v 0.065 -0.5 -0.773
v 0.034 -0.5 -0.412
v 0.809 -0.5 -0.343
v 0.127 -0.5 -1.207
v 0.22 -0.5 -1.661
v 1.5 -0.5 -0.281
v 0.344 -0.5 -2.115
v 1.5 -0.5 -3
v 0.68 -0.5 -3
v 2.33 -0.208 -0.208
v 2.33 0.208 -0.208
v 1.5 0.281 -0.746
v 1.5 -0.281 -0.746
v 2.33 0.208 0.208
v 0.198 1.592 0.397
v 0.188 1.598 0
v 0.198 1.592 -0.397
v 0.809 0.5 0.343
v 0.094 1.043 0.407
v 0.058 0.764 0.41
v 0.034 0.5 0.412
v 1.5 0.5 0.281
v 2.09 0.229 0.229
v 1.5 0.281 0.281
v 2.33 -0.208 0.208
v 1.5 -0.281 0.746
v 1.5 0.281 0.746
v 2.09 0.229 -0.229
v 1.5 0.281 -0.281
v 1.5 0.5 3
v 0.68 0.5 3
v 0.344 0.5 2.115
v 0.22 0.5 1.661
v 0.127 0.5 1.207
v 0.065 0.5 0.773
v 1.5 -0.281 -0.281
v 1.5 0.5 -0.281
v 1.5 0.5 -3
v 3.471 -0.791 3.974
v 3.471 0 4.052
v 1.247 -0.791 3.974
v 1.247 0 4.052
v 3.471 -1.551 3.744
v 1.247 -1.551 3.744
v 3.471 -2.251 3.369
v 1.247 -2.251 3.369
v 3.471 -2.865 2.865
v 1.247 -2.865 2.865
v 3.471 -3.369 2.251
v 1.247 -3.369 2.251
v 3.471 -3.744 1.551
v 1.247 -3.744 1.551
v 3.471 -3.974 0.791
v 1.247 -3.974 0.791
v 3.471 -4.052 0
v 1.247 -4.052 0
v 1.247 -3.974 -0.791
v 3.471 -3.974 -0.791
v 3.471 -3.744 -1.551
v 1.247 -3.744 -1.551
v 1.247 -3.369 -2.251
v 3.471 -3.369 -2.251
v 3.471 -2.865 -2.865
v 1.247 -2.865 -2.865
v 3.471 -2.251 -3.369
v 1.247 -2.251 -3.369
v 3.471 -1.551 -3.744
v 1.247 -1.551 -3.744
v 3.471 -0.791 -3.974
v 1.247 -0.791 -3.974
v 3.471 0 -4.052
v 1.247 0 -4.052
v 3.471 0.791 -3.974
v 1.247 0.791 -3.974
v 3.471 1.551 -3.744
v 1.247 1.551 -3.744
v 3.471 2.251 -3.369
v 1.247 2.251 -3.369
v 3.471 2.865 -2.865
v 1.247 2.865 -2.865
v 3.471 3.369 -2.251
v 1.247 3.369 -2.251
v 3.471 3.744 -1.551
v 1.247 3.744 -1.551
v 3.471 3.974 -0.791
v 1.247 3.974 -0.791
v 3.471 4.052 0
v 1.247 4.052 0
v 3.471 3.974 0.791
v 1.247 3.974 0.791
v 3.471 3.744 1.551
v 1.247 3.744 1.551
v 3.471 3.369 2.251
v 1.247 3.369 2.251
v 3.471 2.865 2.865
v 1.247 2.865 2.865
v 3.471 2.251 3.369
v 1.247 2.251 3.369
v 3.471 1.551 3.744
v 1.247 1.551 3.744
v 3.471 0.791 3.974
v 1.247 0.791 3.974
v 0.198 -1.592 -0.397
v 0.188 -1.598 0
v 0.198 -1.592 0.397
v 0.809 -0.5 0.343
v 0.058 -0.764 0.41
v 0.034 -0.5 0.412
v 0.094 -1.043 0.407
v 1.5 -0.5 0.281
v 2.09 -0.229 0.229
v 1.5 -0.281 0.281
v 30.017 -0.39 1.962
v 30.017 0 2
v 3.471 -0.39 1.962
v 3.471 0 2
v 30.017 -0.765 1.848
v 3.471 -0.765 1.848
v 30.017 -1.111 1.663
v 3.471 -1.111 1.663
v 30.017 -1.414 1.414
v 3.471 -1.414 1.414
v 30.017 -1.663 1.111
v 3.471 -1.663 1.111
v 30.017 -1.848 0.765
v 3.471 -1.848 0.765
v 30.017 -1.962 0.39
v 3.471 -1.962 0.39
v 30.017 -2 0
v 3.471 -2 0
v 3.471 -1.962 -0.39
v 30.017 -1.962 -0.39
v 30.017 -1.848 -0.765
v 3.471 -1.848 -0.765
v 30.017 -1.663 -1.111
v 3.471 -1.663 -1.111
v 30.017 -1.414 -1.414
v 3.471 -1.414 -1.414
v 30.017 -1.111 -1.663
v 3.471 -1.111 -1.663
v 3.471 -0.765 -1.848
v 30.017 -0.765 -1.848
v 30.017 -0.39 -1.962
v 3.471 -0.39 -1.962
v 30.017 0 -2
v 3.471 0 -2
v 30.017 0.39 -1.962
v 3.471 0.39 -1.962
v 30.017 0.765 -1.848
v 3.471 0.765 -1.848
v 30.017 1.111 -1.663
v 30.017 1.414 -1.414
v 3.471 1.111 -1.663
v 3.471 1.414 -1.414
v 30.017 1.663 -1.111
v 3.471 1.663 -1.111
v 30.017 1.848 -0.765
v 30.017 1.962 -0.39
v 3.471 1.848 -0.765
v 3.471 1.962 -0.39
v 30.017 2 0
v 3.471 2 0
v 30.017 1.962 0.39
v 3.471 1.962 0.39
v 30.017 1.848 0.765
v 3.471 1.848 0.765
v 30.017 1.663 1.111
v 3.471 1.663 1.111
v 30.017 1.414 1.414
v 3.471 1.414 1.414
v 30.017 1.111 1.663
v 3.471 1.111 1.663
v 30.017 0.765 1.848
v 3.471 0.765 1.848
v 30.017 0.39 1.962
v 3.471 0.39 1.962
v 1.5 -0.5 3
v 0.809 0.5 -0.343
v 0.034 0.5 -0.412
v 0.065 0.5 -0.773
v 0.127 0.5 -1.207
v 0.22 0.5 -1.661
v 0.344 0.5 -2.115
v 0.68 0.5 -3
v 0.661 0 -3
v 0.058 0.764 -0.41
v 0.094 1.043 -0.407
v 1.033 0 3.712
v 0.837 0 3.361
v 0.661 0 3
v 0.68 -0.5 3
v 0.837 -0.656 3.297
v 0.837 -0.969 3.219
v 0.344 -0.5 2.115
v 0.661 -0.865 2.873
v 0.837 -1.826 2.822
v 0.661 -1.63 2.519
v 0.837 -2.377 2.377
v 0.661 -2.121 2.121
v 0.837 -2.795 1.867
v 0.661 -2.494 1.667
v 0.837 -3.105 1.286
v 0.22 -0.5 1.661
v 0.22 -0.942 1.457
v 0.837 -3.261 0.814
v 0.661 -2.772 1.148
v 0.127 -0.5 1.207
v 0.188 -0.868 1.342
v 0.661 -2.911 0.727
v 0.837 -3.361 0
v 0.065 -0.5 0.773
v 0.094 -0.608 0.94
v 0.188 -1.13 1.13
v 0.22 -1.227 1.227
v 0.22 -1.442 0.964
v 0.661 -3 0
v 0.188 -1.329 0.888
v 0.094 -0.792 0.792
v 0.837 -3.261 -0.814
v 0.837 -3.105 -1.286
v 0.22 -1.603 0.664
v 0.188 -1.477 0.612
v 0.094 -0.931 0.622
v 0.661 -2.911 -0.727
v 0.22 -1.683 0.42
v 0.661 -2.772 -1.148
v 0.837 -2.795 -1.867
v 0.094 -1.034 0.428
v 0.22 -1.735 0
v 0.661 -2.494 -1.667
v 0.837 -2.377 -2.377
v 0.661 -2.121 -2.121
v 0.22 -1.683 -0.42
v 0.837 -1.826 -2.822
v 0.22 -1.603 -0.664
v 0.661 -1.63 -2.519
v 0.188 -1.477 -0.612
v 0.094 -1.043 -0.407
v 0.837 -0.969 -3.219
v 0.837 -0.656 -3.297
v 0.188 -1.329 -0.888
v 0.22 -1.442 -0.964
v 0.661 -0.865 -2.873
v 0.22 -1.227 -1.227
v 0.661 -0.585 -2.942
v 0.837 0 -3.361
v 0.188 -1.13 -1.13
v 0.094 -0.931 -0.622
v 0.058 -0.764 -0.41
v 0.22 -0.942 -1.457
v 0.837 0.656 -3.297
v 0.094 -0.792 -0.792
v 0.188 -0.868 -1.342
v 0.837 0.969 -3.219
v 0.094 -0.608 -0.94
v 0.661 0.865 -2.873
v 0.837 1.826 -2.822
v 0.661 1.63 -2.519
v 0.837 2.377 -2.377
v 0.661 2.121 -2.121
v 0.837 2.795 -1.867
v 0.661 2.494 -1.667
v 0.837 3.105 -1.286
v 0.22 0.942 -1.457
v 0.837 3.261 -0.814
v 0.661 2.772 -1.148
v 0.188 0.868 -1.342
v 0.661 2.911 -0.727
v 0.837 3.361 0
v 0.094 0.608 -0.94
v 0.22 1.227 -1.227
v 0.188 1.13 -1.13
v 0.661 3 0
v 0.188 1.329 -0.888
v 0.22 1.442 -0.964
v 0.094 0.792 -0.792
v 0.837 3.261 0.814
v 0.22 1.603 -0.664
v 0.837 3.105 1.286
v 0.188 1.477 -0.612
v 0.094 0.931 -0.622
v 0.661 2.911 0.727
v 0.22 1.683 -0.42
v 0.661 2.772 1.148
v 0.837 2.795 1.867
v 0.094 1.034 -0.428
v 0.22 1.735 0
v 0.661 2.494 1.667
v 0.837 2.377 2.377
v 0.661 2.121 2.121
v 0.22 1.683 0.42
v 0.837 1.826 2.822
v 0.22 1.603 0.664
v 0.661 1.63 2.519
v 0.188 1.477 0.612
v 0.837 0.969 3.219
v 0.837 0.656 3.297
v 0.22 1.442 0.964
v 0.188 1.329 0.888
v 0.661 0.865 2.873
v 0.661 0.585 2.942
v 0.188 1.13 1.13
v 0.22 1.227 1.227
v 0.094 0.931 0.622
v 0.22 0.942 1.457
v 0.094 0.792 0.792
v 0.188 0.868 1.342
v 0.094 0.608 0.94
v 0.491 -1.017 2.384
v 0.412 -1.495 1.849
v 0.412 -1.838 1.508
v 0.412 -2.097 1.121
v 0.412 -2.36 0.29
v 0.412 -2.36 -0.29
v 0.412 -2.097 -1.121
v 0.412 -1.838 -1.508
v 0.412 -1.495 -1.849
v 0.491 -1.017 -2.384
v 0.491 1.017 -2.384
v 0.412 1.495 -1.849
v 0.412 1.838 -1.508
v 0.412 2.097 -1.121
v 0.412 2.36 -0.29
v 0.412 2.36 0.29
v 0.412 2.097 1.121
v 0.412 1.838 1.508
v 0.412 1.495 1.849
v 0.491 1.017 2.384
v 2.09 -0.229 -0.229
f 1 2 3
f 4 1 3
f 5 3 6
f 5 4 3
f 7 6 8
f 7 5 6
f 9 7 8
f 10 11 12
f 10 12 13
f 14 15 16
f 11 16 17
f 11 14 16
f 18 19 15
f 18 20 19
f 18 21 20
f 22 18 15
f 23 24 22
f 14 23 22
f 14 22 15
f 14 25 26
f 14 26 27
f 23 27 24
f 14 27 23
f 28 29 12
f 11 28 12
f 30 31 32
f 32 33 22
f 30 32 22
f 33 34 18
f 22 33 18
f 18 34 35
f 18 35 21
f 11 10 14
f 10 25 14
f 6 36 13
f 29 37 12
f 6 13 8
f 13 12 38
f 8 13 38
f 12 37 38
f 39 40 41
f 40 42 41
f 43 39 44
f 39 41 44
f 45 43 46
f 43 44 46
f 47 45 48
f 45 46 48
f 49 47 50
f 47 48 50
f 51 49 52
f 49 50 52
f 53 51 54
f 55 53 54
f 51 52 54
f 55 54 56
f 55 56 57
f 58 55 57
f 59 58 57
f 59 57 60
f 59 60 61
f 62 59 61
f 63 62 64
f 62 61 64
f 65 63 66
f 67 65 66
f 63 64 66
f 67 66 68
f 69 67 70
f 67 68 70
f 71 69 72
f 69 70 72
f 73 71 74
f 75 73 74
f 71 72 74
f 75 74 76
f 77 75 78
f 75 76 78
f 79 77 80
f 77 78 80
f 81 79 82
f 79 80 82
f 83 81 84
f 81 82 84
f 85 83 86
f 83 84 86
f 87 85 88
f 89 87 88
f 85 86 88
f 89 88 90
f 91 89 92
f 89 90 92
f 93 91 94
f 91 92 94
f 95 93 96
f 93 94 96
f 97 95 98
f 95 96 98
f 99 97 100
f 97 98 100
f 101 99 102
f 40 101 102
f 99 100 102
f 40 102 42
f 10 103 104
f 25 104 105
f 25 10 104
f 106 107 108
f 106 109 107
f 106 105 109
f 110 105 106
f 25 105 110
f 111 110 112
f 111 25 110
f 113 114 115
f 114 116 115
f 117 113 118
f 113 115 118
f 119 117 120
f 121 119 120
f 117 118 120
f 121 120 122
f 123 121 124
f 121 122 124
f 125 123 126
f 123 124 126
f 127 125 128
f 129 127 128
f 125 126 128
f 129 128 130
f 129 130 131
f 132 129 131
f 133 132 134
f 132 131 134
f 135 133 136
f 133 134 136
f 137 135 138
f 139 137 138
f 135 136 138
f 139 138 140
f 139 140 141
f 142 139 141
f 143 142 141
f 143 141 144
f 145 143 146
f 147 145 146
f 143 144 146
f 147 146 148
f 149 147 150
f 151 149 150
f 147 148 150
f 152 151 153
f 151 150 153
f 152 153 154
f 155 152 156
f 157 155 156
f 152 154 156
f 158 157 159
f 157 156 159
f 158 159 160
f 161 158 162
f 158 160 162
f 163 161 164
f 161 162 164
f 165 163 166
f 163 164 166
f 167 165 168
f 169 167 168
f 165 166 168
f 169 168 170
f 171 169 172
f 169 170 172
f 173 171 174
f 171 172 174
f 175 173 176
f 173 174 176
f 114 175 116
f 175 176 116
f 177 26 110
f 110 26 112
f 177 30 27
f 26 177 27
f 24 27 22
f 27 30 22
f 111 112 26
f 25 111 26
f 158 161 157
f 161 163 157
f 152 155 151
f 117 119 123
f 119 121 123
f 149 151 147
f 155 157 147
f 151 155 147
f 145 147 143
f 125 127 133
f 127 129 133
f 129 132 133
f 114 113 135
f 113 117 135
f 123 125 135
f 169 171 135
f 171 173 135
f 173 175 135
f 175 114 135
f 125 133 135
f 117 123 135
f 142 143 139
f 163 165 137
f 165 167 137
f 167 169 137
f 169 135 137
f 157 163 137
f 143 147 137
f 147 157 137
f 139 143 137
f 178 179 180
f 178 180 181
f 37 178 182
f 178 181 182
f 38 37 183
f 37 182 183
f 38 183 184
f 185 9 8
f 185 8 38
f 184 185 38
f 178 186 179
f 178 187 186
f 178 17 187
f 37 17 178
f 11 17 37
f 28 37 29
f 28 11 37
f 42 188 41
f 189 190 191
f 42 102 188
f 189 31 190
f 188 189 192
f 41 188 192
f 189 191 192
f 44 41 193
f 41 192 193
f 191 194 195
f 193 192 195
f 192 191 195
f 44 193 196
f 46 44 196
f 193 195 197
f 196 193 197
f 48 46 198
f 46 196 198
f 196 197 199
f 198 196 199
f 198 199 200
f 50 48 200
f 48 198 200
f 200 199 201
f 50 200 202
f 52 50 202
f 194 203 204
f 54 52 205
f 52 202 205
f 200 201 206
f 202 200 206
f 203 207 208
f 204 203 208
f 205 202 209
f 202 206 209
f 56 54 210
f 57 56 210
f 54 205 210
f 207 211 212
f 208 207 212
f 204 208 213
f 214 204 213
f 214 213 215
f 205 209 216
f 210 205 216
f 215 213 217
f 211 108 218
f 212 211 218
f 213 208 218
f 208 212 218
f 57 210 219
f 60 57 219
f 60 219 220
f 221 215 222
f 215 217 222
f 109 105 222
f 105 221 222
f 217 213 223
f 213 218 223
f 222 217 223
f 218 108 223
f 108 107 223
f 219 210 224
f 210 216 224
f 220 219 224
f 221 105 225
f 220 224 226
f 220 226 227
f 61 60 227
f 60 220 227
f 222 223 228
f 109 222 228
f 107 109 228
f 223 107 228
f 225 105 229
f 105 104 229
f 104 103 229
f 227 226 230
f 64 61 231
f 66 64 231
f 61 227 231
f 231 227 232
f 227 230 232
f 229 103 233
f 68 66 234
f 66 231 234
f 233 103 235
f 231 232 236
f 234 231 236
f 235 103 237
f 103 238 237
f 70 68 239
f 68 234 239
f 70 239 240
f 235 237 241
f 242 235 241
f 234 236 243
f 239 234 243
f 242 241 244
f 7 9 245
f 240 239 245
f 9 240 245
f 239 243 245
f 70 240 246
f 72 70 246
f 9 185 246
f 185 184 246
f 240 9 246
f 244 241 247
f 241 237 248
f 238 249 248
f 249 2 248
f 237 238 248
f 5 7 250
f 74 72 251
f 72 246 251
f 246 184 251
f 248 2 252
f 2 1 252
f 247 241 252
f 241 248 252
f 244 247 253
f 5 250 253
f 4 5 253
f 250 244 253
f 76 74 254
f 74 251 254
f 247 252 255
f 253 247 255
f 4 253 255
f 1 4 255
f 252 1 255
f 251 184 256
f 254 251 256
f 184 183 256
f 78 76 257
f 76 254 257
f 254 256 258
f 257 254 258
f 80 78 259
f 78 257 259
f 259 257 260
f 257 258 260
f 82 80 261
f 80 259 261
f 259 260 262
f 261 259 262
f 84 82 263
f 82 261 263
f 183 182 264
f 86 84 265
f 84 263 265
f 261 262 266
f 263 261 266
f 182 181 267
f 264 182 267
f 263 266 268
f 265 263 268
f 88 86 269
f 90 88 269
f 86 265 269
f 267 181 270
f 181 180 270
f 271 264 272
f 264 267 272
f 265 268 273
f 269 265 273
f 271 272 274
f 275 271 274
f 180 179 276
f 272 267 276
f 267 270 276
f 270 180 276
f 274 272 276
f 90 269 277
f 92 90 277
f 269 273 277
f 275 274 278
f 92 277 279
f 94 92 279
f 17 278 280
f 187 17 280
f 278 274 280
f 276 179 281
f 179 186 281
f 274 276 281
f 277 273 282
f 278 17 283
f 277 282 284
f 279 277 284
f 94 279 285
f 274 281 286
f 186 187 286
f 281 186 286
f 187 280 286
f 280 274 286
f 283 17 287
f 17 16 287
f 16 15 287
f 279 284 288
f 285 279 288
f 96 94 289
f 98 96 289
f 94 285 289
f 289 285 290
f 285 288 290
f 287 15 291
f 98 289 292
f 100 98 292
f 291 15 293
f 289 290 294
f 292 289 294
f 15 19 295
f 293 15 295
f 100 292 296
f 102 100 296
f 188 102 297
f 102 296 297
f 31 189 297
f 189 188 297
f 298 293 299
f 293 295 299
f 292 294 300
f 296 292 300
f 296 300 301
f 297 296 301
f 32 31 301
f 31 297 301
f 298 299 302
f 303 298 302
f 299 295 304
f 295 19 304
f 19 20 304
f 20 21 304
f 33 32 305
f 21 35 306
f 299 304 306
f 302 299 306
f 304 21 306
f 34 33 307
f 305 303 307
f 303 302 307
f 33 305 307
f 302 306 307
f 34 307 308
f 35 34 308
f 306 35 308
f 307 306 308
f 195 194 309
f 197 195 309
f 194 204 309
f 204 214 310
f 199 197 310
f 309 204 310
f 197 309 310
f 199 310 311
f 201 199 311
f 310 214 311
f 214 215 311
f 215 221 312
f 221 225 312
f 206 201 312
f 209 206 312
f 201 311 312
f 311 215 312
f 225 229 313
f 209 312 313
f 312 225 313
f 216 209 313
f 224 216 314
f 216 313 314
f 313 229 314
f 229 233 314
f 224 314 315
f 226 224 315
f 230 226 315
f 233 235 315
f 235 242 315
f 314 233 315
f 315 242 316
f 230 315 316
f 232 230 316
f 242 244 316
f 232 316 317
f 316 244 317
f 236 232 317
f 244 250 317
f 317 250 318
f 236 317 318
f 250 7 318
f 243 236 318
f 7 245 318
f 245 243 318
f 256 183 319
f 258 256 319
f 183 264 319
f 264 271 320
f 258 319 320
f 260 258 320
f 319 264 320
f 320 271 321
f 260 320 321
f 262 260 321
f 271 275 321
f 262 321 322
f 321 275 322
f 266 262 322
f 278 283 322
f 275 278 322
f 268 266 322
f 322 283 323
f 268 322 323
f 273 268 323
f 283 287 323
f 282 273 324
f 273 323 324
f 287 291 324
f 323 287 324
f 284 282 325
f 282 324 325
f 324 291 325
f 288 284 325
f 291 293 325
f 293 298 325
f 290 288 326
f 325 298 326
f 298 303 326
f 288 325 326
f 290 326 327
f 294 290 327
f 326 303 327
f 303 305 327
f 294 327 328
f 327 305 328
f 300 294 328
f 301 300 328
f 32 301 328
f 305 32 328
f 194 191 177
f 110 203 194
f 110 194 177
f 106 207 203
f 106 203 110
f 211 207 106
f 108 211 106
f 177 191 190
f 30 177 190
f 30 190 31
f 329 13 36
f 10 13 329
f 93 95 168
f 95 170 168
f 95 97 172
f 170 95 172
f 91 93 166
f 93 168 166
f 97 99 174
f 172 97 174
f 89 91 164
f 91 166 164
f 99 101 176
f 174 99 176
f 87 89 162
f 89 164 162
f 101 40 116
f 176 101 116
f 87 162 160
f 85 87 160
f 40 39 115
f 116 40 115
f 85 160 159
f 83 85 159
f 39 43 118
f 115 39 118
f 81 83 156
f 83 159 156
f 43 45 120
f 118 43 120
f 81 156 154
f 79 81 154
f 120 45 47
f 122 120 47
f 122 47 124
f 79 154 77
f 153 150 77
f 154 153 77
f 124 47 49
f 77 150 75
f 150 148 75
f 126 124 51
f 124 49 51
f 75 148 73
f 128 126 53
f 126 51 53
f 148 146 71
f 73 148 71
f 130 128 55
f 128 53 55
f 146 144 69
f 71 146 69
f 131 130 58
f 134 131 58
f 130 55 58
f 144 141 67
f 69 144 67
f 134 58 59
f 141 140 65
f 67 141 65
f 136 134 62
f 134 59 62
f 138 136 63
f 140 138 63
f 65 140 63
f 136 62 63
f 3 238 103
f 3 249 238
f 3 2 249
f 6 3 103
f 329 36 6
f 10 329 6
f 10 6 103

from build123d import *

# Parameters (mm, degrees)
SKETCH2_W         = 6
SKETCH2_H         = 1
SLOT_DEPTH        = 1.5
CIRPATTERN1_COUNT = 2
CIRPATTERN1_ANGLE = 90


with BuildPart() as part:
    # BodySke → Base-Revolve (revolve)
    with BuildSketch(Plane.XY, mode=Mode.PRIVATE) as base_revolve_sk:
        with BuildLine():
            Line((0, 0), (30.016891186, 0))
            Line((30.016891186, 0), (30.016891186, 2))
            Line((30.016891186, 2), (3.470777776, 2))
            Line((3.470777776, 2), (3.470777776, 4.052285877))
            Line((3.470777776, 4.052285877), (1.246697171, 4.052285877))
            ThreePointArc((1.246697171, 4.052285877), (0.326924477, 2.117338651), (0, 0))
        make_face()
    revolve(base_revolve_sk.sketch.rotate(Axis((-15.875, 0, 0), (1, 0, 0)), 90), axis=Axis((-15.875, 0, 0), (1, 0, 0)))

    # Sketch2 → Slot (cut)
    with BuildSketch(Plane(origin=(0, 0, 0), x_dir=(0, 0, -1), z_dir=(1, 0, 0))):
        Rectangle(SKETCH2_W, SKETCH2_H)
    extrude(amount=SLOT_DEPTH, mode=Mode.SUBTRACT)

    # Sketch3 → Cross section 0
    with BuildSketch(Plane(origin=(0, 0, 0), x_dir=(0, 0, -1), z_dir=(1, 0, 0))):
        with BuildLine():
            Line((0.415, -1.72), (-0.415, -1.72))
            Line((-0.415, -1.72), (-0.415, 1.72))
            Line((-0.415, 1.72), (0.415, 1.72))
            Line((0.415, 1.72), (0.415, -1.72))
        make_face()
    # Sketch4 → Cross section 1
    with BuildSketch(Plane(origin=(2.33, 0, 0), x_dir=(0, 0, -1), z_dir=(1, 0, 0))):
        with BuildLine():
            Line((0.2075, -0.2075), (-0.2075, -0.2075))
            Line((-0.2075, -0.2075), (-0.2075, 0.2075))
            Line((-0.2075, 0.2075), (0.2075, 0.2075))
            Line((0.2075, 0.2075), (0.2075, -0.2075))
        make_face()
    cross = loft(mode=Mode.SUBTRACT)

    # CirPattern1: Cross ×2 about axis
    cirpattern1_axis = Axis((0, 0, 0), (1, 0, 0))
    for i in range(1, CIRPATTERN1_COUNT):
        add(cross.rotate(cirpattern1_axis, i * CIRPATTERN1_ANGLE / (CIRPATTERN1_COUNT - 1)), mode=Mode.SUBTRACT)


solid = part.part
